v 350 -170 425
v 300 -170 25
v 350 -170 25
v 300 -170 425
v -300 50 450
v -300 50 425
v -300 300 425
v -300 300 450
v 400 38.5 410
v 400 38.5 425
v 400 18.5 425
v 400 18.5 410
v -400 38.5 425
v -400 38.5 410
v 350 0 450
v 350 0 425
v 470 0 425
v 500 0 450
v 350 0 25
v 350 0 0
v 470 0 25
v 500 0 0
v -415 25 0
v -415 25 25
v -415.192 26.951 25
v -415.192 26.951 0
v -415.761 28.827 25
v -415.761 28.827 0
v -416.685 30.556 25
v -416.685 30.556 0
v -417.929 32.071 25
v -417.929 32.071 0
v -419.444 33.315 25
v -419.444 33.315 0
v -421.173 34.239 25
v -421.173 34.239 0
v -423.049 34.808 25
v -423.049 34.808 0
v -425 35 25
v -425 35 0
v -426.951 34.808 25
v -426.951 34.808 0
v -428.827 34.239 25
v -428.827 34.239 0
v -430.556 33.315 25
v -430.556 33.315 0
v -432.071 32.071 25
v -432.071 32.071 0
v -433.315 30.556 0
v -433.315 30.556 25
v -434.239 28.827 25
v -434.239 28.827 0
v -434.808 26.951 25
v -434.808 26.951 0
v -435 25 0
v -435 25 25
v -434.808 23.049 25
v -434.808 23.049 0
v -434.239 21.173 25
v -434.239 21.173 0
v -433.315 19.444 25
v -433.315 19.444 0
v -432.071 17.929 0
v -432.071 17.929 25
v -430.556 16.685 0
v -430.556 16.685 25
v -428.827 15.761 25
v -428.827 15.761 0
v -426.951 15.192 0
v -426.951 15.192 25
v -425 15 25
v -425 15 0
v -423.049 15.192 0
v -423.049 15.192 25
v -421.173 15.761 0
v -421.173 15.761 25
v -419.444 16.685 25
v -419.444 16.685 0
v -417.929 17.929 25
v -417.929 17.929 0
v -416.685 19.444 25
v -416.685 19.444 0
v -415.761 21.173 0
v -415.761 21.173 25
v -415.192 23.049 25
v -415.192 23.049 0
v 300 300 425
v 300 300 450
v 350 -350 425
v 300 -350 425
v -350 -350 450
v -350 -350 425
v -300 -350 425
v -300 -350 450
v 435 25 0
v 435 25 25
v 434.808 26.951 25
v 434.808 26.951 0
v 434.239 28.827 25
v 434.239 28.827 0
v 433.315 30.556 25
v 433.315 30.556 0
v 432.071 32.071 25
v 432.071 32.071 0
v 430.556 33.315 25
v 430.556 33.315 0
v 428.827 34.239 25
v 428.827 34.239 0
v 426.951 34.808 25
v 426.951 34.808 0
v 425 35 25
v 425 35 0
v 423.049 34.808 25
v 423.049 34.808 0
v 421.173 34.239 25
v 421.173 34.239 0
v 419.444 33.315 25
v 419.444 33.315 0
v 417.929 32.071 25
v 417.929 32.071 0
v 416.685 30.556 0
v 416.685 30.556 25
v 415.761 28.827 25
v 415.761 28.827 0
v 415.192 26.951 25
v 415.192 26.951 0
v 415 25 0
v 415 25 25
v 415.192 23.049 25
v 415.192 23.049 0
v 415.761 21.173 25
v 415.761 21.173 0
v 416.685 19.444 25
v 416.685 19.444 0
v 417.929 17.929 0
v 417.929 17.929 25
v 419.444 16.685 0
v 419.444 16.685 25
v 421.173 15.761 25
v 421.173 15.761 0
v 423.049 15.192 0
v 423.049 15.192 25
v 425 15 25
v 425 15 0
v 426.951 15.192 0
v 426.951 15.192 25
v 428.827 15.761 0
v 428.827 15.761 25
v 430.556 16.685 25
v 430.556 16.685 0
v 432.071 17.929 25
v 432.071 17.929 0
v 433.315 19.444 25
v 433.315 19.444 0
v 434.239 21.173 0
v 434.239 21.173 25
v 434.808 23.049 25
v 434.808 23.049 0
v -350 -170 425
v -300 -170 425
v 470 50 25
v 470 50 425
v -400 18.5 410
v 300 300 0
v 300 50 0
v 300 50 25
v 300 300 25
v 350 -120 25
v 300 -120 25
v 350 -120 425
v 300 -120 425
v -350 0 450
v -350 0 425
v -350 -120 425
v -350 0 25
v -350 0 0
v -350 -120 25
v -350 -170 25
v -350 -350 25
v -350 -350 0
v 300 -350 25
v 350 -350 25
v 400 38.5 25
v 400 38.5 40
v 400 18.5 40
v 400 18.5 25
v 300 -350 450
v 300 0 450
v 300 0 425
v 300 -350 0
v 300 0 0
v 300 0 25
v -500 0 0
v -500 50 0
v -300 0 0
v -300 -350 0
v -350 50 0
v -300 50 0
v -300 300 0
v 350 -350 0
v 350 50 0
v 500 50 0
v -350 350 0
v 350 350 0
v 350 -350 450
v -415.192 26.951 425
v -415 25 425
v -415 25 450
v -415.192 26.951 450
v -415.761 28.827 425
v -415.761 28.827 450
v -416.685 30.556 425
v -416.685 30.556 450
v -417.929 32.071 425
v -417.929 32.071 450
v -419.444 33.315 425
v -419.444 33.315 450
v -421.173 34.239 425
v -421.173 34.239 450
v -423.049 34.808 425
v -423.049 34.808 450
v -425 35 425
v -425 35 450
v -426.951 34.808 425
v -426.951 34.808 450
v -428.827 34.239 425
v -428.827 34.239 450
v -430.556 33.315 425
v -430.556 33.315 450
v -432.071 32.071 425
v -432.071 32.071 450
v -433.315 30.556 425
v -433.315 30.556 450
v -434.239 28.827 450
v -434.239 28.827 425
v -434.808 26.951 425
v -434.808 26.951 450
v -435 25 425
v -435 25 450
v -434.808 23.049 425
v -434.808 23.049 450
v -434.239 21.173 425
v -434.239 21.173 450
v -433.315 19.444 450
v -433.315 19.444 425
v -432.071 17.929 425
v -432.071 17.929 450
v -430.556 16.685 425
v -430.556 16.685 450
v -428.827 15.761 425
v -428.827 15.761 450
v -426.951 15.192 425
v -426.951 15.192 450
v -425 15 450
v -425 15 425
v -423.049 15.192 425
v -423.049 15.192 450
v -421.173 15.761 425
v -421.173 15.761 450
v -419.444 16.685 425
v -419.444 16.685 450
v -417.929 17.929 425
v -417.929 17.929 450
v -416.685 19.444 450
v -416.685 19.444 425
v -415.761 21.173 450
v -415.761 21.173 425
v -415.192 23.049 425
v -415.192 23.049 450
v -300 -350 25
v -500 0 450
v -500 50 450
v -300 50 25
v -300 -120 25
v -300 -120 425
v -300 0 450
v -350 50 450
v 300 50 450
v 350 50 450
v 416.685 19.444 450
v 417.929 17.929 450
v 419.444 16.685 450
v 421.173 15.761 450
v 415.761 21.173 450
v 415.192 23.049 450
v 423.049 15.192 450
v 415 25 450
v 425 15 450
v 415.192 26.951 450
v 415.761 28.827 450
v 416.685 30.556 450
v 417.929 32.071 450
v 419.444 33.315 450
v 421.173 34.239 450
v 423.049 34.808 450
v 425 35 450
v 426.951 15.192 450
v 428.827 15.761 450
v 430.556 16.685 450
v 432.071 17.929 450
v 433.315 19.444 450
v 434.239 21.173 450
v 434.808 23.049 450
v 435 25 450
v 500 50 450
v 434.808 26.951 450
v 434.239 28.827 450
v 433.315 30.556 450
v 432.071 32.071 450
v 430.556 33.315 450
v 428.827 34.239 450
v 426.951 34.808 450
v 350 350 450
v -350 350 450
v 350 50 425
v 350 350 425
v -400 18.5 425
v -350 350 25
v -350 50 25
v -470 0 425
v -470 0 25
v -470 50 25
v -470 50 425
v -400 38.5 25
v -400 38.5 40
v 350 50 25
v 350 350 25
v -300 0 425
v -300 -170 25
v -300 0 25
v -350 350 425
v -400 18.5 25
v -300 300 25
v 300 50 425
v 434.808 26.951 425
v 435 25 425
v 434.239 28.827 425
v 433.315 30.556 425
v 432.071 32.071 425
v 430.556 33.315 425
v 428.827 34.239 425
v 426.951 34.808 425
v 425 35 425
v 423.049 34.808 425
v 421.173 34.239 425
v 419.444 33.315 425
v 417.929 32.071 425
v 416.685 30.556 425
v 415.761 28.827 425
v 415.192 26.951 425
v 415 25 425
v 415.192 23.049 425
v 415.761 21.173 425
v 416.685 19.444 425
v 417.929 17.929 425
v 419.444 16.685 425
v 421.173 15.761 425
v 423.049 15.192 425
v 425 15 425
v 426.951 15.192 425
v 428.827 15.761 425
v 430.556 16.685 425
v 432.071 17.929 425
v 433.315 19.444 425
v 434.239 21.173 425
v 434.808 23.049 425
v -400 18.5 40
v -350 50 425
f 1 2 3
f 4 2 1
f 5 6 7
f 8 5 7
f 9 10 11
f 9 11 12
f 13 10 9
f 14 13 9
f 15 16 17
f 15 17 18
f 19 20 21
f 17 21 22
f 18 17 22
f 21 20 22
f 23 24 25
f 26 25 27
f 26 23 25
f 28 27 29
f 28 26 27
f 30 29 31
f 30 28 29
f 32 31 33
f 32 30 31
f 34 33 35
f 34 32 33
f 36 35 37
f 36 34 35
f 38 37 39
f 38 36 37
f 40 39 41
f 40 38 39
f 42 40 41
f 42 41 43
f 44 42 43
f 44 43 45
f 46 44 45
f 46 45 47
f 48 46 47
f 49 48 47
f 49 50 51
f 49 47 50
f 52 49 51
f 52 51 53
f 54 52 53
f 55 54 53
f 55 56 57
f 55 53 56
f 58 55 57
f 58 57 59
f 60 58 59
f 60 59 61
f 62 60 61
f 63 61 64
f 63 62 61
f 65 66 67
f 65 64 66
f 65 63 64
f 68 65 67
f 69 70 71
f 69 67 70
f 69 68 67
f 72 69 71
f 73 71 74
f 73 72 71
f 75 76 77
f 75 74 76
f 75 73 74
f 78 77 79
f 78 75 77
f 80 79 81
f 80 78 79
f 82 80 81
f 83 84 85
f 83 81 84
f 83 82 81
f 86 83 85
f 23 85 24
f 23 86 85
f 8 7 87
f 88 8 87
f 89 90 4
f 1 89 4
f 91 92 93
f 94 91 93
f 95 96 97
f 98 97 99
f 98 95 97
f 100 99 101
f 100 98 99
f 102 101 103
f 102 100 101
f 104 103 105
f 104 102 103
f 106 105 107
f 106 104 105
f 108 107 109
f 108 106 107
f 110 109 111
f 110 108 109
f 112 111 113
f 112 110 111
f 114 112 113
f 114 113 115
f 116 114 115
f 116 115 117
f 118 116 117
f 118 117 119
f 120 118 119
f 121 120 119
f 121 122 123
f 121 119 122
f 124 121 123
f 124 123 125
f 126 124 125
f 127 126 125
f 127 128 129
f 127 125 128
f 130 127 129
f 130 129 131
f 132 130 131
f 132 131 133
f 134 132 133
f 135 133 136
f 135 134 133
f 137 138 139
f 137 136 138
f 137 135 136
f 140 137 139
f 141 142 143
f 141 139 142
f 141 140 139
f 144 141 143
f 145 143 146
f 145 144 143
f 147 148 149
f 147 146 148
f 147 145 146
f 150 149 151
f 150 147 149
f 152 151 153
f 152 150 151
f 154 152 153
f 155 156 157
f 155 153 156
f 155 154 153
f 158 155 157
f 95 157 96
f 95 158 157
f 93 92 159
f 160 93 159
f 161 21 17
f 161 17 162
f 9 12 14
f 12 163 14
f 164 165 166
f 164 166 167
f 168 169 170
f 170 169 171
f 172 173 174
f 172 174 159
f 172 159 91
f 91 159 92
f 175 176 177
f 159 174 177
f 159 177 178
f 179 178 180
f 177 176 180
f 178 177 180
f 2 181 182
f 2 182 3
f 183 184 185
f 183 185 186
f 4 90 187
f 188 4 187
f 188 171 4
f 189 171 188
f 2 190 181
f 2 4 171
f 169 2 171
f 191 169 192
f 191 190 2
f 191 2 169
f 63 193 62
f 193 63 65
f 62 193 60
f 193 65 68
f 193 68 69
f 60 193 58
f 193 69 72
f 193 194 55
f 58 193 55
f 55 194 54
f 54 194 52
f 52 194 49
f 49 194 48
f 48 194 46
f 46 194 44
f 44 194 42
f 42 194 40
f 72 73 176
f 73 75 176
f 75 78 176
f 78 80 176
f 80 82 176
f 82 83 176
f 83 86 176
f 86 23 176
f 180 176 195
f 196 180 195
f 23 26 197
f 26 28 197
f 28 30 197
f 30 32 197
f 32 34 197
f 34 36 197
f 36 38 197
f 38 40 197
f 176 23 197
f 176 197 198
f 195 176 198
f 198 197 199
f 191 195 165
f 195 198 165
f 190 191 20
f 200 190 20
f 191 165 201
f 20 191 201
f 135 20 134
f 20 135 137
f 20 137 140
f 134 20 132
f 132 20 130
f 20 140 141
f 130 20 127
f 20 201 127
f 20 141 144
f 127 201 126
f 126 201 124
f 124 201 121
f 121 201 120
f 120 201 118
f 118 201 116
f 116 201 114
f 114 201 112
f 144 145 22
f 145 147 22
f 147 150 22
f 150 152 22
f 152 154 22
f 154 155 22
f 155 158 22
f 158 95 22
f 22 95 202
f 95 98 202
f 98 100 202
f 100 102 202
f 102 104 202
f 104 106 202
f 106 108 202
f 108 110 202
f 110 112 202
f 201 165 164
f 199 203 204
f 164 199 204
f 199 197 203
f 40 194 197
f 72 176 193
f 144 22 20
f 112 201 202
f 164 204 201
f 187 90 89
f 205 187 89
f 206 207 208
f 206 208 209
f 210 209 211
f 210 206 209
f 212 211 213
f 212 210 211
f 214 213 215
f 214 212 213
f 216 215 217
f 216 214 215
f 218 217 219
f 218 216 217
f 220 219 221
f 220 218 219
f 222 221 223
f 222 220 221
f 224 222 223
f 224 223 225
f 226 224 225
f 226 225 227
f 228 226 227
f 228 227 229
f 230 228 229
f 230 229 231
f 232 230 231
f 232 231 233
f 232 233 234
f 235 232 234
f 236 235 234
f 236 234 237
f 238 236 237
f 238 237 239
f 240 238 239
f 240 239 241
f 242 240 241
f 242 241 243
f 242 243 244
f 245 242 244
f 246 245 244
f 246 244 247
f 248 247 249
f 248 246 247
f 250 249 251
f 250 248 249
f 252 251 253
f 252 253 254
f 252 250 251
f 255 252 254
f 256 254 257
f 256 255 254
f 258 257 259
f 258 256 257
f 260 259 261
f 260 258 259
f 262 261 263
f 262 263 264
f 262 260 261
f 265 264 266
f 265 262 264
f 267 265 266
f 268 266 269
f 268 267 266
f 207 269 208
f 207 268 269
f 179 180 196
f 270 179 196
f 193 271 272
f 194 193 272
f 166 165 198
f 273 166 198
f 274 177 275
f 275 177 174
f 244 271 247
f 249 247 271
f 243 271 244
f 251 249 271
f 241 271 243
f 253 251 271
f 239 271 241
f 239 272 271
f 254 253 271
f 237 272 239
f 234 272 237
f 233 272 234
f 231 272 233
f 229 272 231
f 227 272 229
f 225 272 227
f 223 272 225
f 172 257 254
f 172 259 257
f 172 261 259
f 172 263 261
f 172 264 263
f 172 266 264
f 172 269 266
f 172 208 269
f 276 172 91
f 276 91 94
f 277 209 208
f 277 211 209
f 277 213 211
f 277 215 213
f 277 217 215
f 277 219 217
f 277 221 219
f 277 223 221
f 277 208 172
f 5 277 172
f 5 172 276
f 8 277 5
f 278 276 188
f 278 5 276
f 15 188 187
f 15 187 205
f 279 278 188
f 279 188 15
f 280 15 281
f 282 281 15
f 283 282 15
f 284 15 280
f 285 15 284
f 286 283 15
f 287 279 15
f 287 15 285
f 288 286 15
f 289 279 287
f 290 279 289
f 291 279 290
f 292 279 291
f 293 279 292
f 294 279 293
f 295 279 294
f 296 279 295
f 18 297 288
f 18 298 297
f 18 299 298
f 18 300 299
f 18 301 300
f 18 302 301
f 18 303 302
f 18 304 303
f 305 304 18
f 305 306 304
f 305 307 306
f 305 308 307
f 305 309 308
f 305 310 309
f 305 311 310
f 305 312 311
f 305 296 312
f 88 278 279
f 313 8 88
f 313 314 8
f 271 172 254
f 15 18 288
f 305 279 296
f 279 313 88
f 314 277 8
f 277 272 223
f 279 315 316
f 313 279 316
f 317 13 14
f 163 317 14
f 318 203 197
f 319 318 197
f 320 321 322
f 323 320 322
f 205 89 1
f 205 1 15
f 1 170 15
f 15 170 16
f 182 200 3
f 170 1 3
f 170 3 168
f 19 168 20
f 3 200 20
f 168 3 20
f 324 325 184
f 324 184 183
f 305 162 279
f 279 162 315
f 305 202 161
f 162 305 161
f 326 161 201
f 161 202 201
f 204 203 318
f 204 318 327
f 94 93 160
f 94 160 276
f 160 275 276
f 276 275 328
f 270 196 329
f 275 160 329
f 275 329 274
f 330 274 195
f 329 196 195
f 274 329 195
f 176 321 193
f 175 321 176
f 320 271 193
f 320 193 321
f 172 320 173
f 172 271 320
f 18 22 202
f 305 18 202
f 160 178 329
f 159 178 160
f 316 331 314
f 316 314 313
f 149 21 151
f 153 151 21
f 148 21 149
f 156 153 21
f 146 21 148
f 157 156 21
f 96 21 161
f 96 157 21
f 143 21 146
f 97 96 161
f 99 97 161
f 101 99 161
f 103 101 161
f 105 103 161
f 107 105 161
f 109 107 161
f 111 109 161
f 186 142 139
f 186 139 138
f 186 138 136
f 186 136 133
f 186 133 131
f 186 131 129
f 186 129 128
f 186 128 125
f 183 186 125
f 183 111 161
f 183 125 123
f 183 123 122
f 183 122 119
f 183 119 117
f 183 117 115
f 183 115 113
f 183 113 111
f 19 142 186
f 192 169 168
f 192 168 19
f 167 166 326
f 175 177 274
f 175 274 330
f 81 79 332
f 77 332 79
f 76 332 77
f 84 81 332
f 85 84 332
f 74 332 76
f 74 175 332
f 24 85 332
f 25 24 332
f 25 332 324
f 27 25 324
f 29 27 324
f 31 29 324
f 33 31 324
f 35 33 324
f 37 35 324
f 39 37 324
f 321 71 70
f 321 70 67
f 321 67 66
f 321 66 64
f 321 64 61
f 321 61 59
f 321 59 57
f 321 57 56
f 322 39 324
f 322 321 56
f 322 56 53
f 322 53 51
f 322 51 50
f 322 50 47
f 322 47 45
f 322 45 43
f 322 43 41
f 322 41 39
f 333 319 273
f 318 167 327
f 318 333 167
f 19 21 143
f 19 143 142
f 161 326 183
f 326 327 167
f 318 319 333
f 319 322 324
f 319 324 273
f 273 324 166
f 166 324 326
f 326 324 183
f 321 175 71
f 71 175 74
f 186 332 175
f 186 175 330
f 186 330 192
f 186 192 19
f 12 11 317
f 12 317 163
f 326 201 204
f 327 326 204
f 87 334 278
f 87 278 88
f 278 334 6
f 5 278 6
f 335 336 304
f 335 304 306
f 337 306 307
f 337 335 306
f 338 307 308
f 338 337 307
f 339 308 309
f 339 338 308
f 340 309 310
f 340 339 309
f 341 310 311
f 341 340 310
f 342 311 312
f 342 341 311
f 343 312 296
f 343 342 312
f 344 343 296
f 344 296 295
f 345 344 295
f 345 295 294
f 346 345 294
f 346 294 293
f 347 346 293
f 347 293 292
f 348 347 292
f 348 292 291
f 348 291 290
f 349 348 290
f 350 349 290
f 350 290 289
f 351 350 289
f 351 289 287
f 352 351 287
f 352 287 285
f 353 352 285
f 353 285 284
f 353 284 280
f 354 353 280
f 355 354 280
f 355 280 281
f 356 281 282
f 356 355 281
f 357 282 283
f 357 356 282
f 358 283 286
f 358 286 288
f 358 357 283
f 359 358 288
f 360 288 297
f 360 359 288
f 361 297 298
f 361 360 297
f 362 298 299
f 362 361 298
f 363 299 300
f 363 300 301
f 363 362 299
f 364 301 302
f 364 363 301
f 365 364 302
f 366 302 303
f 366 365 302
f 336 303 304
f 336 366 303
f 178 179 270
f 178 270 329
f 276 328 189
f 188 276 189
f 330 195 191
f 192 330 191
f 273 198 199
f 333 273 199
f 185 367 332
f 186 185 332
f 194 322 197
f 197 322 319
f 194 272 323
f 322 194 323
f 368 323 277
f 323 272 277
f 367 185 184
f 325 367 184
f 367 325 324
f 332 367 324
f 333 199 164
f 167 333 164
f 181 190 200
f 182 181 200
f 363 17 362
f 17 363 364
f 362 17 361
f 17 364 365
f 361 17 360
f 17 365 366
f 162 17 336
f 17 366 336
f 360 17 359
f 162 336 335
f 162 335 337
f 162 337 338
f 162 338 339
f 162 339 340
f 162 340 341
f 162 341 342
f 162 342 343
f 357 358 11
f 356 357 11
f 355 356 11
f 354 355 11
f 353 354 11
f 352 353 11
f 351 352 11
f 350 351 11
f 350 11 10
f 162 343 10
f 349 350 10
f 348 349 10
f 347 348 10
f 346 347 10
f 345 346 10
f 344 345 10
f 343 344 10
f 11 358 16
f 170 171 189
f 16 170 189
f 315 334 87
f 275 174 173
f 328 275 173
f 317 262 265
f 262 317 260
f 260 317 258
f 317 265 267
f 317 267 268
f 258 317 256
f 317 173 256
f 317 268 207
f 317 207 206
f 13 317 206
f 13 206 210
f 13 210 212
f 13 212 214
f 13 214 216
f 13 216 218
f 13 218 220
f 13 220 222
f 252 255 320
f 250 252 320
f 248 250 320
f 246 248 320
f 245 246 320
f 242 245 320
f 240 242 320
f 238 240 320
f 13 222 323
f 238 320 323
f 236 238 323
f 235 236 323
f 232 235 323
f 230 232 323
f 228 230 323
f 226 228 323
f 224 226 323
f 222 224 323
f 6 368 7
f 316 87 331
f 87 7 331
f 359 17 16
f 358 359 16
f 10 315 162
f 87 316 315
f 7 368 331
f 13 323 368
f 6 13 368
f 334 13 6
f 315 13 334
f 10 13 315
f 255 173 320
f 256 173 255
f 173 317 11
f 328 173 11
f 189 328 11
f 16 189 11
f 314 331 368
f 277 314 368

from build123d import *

# Parameters (mm, degrees)
CROQUIS1_W                   = 700
CROQUIS1_H                   = 50
CROQUIS1_W_2                 = 50
CROQUIS1_H_2                 = 250
CROQUIS1_H_3                 = 350
CROQUIS1_R                   = 10
SALIENTE_EXTRUIR1_DEPTH      = 450
CROQUIS4_W                   = 400
CROQUIS4_H                   = 470
CROQUIS4_H_2                 = 180
CORTAR_EXTRUIR1_DEPTH        = 151
CORTAR_EXTRUIR1_DEPTH_BACK   = 851
CROQUIS5_W                   = 30
CROQUIS5_H                   = 50
SALIENTE_EXTRUIR2_DEPTH      = 425
CROQUIS6_W                   = 15
CROQUIS6_H                   = 20
SALIENTE_EXTRUIR3_DEPTH      = 400
SALIENTE_EXTRUIR3_DEPTH_BACK = 400


with BuildPart() as part:
    # Croquis1 → Saliente-Extruir1 (new body)
    with BuildSketch(Plane.XY):
        with Locations((0, 325)):
            Rectangle(CROQUIS1_W, CROQUIS1_H)
        with Locations((325, 175)):
            Rectangle(CROQUIS1_W_2, CROQUIS1_H_2)
        with Locations((-325, 175)):
            Rectangle(CROQUIS1_W_2, CROQUIS1_H_2)
        with Locations((-325, -175)):
            Rectangle(CROQUIS1_W_2, CROQUIS1_H_3)
        with Locations((325, -175)):
            Rectangle(CROQUIS1_W_2, CROQUIS1_H_3)
        Polygon((-500, 50), (-500, 0), (-350, 0), (-300, 0), (300, 0), (350, 0), (500, 0), (500, 50), (350, 50), (300, 50), (-300, 50), (-350, 50), align=None)
        with Locations((-425, 25)):
            Circle(CROQUIS1_R, mode=Mode.SUBTRACT)
        with Locations((425, 25)):
            Circle(CROQUIS1_R, mode=Mode.SUBTRACT)
    extrude(amount=SALIENTE_EXTRUIR1_DEPTH)

    # Croquis4 → Cortar-Extruir1 (cut, two sides)
    with BuildSketch(Plane.ZY.offset(350)) as cortar_extruir1_sk:
        with Locations((225, 115)):
            Rectangle(CROQUIS4_W, CROQUIS4_H)
        with Locations((225, -260)):
            Rectangle(CROQUIS4_W, CROQUIS4_H_2)
    extrude(amount=CORTAR_EXTRUIR1_DEPTH, mode=Mode.SUBTRACT)
    extrude(cortar_extruir1_sk.sketch, amount=-CORTAR_EXTRUIR1_DEPTH_BACK, mode=Mode.SUBTRACT)

    # Croquis5 → Saliente-Extruir2 (add)
    with BuildSketch(Plane.XY.offset(450)):
        with Locations((-485, 25)):
            Rectangle(CROQUIS5_W, CROQUIS5_H)
        with Locations((485, 25)):
            Rectangle(CROQUIS5_W, CROQUIS5_H)
    extrude(amount=-SALIENTE_EXTRUIR2_DEPTH)

    # Croquis6 → Saliente-Extruir3 (add, two sides)
    with BuildSketch(Plane(origin=(0, 0, 0), x_dir=(0, 0, -1), z_dir=(1, 0, 0))) as saliente_extruir3_sk:
        with Locations((-32.5, 28.5)):
            Rectangle(CROQUIS6_W, CROQUIS6_H)
        with Locations((-417.5, 28.5)):
            Rectangle(CROQUIS6_W, CROQUIS6_H)
    extrude(amount=SALIENTE_EXTRUIR3_DEPTH)
    extrude(saliente_extruir3_sk.sketch, amount=-SALIENTE_EXTRUIR3_DEPTH_BACK)


solid = part.part
